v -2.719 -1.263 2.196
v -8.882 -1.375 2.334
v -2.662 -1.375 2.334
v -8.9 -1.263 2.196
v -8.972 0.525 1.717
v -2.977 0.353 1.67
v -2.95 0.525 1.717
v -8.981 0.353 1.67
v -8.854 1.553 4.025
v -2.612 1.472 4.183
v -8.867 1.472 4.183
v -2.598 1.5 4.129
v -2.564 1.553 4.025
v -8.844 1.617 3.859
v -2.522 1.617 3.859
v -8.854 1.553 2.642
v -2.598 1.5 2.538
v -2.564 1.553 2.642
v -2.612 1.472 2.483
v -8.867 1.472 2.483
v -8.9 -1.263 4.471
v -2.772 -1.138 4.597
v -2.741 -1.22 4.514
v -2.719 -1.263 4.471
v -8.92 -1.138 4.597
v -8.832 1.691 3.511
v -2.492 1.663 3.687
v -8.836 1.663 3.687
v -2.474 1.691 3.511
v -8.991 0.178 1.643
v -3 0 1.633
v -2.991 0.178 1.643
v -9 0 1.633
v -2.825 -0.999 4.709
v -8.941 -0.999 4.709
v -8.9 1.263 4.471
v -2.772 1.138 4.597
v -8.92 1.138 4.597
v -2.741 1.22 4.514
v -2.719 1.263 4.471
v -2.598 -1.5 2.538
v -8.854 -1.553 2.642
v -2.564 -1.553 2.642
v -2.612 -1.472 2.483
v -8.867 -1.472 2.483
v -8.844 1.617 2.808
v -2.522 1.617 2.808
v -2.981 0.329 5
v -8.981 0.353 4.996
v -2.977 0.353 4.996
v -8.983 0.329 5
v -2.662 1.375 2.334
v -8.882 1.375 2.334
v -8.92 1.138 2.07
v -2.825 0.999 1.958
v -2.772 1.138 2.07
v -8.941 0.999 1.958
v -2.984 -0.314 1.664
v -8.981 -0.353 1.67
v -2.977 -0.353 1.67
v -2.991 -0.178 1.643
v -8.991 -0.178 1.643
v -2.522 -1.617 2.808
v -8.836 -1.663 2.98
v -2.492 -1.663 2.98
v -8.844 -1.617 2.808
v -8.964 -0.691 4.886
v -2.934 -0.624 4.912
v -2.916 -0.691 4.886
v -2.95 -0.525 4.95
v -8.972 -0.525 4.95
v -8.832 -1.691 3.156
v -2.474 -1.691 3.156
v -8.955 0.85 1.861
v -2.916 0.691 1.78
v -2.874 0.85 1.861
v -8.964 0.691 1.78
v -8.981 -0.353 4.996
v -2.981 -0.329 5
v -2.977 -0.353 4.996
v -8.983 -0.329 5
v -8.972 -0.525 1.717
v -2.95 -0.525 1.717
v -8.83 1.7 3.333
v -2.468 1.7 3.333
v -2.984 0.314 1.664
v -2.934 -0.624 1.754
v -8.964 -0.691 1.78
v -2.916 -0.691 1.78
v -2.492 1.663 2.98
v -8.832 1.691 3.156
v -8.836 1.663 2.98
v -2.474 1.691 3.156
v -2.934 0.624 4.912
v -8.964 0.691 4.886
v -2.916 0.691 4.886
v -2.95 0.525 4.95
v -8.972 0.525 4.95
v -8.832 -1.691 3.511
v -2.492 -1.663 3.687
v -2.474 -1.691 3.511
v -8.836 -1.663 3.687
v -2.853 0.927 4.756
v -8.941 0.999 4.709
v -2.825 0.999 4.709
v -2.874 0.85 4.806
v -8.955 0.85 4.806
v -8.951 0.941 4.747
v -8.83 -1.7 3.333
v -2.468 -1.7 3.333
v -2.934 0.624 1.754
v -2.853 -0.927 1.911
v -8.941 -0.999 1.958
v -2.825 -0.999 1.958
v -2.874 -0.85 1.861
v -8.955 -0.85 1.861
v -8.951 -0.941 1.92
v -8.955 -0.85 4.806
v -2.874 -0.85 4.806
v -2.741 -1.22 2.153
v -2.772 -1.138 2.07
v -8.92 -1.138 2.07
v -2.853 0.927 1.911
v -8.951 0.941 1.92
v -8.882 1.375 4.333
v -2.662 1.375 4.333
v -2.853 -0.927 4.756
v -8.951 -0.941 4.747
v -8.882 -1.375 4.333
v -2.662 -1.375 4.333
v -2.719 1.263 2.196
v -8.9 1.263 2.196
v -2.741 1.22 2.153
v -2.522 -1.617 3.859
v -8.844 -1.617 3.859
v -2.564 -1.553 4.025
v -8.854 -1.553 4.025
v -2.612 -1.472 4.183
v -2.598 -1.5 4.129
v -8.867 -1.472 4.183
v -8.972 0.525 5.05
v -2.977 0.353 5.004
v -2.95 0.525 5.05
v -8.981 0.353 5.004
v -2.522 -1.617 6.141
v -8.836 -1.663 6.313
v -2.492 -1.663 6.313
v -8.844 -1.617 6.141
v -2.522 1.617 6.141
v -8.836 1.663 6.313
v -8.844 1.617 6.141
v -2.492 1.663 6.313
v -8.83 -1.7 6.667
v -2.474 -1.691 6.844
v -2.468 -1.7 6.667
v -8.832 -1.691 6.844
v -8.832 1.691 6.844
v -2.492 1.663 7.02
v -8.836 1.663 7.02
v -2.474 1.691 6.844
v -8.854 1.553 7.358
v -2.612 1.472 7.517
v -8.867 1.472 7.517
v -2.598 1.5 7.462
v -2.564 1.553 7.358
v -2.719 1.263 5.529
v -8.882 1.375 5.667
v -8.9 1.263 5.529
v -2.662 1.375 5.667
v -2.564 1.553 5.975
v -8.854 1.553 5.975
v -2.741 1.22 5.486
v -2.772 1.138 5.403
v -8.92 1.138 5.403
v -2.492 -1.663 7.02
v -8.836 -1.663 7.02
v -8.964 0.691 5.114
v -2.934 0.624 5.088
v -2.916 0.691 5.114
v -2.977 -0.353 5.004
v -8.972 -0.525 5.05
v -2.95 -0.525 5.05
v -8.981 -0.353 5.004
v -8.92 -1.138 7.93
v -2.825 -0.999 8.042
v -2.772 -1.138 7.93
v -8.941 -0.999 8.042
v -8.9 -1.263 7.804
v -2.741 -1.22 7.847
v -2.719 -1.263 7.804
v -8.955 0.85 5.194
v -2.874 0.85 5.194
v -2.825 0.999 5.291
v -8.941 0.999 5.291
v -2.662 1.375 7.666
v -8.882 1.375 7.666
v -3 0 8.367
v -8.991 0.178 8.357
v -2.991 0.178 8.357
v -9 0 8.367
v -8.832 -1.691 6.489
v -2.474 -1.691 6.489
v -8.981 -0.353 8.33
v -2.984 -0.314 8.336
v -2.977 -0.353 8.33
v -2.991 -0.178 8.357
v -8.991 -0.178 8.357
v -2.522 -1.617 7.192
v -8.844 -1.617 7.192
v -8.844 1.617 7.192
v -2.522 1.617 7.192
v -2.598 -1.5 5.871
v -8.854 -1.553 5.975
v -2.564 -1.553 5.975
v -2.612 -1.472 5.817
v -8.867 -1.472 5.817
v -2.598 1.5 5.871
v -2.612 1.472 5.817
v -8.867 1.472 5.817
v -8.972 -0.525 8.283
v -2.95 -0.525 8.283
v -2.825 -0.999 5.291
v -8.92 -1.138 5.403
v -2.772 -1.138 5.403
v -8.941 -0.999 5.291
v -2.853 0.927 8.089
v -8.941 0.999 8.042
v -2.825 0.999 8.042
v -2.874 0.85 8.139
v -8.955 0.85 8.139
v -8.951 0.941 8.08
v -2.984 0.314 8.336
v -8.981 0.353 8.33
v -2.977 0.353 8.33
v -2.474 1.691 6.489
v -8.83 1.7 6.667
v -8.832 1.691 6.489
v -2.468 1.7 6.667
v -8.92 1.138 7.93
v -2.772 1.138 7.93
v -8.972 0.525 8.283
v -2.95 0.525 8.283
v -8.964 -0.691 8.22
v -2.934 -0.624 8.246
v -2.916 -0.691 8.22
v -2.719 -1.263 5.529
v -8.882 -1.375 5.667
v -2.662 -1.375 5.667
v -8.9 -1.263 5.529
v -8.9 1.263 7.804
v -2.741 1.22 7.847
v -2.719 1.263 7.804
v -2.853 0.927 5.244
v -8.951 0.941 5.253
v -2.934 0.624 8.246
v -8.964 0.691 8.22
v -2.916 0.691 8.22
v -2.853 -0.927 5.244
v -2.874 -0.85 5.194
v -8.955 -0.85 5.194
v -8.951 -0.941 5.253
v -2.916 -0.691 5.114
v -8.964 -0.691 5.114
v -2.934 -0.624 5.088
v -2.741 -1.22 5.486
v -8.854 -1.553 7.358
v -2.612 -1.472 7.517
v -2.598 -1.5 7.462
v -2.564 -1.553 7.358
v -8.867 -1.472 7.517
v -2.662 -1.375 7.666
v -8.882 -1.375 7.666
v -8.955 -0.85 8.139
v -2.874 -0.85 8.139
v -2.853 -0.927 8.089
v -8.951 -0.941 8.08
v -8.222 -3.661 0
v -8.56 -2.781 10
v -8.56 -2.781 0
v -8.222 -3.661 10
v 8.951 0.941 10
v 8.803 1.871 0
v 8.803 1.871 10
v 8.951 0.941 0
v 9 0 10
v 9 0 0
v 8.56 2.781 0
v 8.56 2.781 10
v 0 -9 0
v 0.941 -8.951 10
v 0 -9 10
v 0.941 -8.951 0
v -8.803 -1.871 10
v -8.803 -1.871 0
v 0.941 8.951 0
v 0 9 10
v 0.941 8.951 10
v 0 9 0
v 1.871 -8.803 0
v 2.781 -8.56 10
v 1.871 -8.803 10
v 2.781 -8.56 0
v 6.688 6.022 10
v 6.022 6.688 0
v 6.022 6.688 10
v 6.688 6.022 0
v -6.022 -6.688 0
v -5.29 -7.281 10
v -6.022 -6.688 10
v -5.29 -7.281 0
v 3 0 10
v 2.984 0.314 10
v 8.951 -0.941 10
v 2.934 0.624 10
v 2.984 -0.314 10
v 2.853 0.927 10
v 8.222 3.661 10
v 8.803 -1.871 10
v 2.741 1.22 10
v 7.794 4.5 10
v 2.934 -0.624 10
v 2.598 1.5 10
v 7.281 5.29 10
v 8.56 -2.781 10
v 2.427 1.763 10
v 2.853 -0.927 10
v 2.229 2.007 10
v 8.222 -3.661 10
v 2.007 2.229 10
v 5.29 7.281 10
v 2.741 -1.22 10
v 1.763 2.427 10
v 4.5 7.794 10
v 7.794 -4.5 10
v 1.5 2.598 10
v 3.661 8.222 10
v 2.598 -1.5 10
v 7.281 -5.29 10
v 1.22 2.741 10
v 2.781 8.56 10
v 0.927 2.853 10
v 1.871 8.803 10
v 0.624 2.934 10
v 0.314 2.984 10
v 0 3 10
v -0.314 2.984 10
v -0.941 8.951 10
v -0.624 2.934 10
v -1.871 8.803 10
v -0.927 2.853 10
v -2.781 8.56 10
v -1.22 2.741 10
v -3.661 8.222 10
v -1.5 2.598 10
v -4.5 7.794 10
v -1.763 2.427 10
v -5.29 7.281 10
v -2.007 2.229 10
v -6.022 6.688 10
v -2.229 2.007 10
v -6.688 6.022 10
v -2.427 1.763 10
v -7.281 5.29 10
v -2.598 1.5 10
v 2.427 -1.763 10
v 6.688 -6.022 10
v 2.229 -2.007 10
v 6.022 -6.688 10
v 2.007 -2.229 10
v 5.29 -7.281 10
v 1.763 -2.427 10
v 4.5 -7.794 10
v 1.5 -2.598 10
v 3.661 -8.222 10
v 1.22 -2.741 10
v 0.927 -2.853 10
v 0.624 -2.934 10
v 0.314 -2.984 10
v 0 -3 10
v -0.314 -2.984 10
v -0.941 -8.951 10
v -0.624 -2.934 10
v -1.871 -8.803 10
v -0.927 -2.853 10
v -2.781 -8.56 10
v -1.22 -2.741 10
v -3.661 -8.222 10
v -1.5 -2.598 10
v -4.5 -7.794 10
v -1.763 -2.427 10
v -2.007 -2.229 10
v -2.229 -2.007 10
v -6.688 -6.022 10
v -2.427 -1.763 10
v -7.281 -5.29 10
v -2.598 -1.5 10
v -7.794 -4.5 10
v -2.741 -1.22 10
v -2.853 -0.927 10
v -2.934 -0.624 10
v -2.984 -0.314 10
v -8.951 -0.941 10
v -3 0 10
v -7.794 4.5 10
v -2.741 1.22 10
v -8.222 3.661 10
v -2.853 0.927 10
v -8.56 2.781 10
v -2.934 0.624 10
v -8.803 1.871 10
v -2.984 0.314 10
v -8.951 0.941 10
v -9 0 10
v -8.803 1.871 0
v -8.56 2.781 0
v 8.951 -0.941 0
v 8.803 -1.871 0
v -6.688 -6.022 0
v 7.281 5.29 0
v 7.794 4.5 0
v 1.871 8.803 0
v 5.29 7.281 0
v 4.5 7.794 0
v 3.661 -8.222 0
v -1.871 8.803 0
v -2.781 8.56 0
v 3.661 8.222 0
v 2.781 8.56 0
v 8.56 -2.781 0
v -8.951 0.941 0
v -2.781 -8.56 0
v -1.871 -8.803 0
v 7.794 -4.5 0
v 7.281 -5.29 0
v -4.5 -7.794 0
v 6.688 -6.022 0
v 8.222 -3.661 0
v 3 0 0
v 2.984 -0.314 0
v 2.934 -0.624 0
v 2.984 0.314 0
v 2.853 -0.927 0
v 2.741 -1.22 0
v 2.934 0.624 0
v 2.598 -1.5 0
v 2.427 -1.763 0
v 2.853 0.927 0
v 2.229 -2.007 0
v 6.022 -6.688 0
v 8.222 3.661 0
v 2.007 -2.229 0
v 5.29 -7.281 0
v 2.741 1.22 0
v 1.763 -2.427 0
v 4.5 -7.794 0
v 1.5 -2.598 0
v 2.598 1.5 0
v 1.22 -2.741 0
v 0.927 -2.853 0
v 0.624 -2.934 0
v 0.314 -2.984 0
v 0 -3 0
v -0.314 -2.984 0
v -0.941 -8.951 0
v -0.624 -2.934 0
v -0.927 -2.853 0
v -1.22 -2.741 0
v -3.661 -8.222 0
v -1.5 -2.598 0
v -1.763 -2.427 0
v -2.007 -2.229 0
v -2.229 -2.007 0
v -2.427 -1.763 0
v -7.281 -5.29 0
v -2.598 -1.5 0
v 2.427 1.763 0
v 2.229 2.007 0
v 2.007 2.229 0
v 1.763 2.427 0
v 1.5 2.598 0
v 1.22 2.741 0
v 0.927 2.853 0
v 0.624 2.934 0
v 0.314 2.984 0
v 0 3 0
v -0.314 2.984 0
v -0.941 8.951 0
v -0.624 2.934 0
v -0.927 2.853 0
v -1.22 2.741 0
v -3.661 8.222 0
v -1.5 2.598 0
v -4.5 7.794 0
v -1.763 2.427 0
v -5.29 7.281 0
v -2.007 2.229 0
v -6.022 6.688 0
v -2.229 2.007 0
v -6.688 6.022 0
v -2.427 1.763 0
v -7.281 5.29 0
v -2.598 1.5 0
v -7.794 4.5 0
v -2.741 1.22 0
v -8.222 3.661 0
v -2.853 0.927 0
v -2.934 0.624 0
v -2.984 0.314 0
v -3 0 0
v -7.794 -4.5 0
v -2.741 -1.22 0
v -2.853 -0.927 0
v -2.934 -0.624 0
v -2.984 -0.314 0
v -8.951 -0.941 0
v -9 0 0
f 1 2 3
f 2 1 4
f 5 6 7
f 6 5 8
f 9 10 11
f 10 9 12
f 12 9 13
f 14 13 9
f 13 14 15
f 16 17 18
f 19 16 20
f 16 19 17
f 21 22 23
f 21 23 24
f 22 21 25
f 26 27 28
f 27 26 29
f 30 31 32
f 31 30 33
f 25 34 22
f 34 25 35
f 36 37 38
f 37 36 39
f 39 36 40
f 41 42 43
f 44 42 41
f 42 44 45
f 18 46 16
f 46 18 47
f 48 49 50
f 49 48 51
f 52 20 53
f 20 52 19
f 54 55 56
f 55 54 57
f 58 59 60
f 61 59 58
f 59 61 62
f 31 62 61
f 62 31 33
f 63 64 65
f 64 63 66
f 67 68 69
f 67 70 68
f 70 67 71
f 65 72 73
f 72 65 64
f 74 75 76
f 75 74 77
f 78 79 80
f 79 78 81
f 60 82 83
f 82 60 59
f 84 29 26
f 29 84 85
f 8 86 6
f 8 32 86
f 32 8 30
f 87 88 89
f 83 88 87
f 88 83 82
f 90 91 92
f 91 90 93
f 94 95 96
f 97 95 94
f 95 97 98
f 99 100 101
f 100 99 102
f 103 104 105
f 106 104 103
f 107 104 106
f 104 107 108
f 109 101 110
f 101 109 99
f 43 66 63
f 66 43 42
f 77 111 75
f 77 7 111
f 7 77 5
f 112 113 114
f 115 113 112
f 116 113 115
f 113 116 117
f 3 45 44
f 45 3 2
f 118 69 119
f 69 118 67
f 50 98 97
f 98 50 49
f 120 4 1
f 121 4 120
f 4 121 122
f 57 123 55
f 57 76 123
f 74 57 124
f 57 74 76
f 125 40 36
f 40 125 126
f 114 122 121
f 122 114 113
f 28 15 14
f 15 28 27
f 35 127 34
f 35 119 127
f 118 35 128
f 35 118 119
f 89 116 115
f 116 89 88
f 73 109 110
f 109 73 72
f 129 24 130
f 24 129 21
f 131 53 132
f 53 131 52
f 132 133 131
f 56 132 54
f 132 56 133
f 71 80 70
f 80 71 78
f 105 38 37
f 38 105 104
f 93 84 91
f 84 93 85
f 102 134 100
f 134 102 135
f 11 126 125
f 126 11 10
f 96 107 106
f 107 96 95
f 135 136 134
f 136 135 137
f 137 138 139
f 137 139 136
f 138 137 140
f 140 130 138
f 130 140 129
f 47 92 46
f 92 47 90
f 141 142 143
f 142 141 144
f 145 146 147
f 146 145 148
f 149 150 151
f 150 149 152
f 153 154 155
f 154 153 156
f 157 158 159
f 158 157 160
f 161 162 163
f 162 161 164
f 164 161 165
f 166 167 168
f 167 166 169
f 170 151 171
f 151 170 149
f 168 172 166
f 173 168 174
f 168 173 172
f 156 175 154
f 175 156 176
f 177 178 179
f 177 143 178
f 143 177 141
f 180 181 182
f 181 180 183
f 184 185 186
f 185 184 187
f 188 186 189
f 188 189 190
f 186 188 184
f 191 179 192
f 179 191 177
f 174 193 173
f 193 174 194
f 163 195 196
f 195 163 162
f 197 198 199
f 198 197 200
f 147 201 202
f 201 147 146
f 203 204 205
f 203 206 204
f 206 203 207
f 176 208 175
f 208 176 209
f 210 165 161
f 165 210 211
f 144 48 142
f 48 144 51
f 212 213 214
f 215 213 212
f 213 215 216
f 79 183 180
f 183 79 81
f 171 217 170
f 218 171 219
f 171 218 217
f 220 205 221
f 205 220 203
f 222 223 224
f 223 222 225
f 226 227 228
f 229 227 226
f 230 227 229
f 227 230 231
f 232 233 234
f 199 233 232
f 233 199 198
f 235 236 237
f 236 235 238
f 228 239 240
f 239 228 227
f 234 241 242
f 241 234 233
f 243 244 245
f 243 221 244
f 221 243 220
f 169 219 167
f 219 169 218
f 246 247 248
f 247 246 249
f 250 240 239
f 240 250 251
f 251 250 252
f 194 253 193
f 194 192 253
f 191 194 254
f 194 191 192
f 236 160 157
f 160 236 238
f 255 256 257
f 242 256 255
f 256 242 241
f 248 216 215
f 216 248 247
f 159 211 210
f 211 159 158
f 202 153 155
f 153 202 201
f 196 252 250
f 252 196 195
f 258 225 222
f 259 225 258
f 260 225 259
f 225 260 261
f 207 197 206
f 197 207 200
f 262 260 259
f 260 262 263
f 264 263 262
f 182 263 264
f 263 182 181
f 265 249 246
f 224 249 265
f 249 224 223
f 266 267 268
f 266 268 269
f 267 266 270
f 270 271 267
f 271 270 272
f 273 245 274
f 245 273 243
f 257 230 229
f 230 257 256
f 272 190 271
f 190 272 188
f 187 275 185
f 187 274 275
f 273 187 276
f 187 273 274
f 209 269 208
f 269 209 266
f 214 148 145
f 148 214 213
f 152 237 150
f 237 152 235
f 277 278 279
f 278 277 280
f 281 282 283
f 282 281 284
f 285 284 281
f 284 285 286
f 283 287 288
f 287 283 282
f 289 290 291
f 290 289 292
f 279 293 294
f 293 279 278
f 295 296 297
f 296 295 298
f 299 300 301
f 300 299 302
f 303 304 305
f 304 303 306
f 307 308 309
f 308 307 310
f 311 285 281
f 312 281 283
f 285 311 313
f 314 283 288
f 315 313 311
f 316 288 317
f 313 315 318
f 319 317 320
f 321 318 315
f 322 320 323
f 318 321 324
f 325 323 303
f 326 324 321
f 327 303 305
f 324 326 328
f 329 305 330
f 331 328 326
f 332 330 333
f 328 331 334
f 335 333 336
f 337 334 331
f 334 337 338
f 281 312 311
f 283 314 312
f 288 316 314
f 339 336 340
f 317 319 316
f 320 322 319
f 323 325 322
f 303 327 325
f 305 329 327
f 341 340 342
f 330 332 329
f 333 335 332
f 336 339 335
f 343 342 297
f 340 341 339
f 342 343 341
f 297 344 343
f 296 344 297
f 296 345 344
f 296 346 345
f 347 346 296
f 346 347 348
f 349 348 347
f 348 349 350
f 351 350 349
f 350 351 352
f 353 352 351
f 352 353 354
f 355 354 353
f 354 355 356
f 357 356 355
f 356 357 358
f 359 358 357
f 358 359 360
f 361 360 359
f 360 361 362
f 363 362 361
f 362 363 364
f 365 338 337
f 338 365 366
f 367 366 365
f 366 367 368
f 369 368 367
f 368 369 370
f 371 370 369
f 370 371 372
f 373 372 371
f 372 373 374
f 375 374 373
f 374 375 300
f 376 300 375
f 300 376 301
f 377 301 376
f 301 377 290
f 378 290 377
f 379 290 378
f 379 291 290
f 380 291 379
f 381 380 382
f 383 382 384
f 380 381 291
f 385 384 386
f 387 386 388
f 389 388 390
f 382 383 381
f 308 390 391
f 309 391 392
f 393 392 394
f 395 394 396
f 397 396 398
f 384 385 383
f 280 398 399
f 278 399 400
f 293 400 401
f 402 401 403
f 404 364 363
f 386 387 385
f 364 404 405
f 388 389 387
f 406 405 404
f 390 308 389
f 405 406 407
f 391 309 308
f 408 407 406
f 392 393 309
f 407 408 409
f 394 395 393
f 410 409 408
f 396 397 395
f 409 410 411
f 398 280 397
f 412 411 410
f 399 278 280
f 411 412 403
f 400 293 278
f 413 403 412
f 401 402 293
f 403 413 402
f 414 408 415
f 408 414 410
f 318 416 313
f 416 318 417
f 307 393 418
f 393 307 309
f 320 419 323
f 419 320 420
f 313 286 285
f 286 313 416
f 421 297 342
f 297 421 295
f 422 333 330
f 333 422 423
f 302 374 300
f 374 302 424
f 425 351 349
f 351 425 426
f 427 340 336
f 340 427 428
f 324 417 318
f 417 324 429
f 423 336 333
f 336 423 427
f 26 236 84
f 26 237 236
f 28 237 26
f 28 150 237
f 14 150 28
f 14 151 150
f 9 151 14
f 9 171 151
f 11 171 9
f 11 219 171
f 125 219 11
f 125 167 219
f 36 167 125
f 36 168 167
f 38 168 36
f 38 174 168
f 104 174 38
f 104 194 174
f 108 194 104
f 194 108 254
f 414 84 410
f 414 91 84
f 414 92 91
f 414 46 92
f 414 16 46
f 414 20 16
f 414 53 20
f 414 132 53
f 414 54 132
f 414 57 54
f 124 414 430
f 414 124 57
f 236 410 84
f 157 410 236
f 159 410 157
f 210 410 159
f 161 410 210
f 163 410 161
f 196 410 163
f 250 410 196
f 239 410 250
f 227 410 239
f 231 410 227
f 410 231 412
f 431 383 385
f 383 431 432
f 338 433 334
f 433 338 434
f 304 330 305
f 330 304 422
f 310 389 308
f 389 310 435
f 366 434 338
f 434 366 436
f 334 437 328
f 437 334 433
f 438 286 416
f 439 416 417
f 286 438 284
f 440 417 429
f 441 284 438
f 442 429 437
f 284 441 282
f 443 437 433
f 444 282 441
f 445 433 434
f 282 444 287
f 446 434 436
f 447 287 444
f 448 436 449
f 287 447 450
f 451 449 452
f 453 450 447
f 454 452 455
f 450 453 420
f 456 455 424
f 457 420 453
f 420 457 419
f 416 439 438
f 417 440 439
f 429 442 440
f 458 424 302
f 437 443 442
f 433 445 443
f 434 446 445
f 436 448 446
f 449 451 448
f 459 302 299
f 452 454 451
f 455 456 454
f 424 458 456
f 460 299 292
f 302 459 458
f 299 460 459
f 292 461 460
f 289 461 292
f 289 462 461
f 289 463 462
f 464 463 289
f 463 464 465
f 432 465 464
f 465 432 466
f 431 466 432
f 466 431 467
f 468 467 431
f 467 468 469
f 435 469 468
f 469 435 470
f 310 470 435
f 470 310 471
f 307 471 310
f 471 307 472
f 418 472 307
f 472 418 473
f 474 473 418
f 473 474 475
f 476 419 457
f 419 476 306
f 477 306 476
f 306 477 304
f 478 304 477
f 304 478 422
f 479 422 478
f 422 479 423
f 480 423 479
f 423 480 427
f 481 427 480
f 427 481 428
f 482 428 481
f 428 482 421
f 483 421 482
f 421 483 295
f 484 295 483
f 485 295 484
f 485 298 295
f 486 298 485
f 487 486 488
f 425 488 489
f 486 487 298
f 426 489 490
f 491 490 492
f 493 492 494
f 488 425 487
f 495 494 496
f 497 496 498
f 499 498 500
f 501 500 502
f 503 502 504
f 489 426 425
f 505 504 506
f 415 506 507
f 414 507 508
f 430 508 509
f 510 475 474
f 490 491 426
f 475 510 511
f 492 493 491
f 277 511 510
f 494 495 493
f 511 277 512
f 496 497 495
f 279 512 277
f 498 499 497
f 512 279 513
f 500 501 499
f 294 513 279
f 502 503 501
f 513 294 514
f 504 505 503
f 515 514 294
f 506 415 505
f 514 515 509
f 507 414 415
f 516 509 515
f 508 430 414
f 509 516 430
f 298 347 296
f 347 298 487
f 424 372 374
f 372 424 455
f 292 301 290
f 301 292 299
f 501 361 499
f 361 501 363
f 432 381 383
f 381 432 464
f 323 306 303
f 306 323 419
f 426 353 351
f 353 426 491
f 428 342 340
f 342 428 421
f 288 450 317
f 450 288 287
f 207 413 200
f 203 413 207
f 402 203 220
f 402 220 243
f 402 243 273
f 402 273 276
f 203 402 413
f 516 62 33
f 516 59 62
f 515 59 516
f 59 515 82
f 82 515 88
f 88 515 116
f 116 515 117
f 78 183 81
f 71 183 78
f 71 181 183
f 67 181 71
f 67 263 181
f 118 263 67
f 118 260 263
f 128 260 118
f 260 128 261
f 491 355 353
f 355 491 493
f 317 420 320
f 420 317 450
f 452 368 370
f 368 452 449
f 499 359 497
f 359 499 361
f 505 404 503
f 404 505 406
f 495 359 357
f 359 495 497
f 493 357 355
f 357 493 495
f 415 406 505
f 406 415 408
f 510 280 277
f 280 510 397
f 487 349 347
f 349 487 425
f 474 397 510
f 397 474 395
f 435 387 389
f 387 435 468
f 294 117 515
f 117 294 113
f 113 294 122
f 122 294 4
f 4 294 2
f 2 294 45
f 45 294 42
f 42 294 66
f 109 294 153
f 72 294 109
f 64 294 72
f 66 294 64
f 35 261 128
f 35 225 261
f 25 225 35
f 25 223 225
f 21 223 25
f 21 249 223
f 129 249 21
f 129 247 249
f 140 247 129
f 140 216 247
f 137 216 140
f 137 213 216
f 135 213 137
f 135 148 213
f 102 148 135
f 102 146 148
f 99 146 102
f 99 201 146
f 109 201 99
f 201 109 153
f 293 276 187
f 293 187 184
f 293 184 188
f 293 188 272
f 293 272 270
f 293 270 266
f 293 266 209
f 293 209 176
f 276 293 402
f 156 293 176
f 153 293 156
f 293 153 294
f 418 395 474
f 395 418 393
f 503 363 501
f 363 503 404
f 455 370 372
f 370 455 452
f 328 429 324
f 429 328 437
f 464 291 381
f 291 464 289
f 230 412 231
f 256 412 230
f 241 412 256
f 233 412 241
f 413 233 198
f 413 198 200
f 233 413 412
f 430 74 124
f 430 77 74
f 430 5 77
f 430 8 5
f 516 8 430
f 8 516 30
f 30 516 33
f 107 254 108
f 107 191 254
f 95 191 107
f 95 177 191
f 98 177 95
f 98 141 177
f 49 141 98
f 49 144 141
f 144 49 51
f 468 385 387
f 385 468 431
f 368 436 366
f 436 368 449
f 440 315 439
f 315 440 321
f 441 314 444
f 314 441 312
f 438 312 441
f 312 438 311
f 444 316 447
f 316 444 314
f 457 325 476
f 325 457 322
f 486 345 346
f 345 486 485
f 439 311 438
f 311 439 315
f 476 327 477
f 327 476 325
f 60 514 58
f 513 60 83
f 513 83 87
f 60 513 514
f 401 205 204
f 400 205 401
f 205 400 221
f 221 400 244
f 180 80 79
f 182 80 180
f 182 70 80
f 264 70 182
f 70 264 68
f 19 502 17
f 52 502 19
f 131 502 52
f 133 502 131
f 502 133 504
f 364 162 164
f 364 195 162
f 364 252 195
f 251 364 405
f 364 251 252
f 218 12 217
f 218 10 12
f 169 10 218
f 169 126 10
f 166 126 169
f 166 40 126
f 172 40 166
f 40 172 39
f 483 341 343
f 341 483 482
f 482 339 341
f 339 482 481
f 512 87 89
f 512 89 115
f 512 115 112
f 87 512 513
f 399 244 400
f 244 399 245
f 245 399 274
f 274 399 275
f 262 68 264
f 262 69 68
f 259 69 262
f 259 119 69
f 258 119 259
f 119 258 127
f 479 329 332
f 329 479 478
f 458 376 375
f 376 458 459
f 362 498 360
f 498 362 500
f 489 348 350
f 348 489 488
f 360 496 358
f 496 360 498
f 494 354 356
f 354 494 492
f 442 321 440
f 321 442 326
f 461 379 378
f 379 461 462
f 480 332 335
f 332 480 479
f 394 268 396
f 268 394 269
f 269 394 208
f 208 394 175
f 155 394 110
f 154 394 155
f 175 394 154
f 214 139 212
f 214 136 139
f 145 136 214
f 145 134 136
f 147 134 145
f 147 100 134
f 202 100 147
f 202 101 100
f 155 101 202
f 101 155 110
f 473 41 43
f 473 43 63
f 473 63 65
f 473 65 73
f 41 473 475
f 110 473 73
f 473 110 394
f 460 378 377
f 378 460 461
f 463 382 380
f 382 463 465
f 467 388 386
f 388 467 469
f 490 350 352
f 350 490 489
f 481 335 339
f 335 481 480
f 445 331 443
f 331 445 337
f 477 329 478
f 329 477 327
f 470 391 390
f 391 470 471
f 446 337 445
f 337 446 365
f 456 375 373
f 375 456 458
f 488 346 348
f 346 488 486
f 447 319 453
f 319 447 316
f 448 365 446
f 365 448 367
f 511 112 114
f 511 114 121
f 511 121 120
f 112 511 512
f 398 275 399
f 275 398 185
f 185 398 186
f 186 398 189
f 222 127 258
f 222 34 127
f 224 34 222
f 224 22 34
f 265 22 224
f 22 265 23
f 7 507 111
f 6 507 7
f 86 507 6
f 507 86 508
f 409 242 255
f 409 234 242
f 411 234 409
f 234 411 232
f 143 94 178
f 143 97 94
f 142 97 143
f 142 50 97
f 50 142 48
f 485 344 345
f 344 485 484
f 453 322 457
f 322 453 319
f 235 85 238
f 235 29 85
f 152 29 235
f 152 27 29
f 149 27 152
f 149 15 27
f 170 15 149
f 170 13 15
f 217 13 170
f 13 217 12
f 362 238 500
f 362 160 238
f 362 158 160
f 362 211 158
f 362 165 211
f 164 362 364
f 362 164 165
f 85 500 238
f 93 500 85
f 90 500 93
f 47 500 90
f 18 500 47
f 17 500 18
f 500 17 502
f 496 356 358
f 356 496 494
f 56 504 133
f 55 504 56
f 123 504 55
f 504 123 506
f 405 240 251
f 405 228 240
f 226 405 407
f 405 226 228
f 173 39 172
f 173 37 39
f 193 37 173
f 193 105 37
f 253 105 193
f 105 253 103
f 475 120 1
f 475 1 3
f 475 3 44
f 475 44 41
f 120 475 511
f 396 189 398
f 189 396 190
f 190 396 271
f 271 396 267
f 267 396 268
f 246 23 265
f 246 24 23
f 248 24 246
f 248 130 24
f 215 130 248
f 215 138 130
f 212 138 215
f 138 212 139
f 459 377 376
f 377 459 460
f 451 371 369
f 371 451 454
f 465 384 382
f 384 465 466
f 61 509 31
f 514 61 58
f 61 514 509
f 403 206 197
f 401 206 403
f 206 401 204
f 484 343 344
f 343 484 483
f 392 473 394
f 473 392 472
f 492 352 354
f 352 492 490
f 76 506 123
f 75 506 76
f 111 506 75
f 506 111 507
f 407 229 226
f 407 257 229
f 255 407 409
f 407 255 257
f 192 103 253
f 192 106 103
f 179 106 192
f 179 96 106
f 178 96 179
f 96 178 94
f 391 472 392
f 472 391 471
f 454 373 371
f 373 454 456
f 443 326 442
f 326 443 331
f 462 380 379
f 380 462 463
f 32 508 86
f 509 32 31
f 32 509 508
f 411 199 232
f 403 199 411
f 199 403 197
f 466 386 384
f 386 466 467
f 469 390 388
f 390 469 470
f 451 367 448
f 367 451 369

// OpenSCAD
// Double-screw locking collar.
$fn = 60;
eps = 0.02;
shaft_d = 6;
outer_d = 18;
width = 10;
difference() {
    cylinder(d=outer_d,h=width);
    translate([0,0,-eps]) cylinder(d=shaft_d,h=width+2*eps);
    for (z=[width/3,2*width/3]) translate([-outer_d/2-eps,0,z]) rotate([0,90,0]) cylinder(d=3.4,h=outer_d/2+2*eps);
}
